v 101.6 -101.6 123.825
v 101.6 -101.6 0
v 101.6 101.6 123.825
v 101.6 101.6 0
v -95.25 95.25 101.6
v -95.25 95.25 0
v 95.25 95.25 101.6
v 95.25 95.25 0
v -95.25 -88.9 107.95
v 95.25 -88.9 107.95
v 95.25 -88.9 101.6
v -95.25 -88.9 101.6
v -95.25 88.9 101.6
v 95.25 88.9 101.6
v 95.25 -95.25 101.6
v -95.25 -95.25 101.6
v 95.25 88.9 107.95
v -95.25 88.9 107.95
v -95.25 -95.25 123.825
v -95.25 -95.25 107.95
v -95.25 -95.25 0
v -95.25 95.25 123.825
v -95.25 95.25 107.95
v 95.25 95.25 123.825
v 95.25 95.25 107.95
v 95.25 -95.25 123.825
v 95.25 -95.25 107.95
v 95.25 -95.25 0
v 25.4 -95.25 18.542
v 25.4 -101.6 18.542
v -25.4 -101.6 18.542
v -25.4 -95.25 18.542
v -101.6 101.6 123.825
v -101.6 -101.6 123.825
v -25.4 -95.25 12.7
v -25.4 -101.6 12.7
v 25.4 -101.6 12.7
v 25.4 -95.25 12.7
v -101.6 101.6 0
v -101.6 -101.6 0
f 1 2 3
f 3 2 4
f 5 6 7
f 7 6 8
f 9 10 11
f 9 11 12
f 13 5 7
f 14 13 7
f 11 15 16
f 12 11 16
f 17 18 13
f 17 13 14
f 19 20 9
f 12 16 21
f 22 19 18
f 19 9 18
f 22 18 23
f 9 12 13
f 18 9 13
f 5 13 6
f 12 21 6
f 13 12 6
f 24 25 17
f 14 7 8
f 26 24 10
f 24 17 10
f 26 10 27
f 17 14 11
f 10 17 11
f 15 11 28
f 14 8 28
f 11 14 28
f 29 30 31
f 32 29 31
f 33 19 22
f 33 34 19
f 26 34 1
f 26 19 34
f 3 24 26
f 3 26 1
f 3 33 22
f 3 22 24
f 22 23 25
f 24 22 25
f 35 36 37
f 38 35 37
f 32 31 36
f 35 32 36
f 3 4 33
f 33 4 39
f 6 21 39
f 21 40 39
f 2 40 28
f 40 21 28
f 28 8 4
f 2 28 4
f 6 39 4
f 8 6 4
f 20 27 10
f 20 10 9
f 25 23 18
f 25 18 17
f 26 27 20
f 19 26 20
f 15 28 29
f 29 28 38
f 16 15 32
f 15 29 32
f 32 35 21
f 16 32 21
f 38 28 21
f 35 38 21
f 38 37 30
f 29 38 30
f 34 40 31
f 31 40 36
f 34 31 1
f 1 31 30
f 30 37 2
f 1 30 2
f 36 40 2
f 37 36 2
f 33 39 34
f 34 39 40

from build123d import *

# Parameters (mm, degrees)
F1_DEPTH = 123.825
F2_W     = 190.5
F2_H     = 6.35
F3_DEPTH = 6.35
F4_W     = 190.5
F4_H     = 6.35
F5_DEPTH = 6.35
F7_DEPTH = 25.4


with BuildPart() as f1:
    # F0 (on Top) → F1 (new body)
    with BuildSketch(Plane.XY):
        Polygon((101.6, -101.6), (101.6, 101.6), (95.25, 95.25), (95.25, -95.25), align=None)
        Polygon((-95.25, -95.25), (-101.6, -101.6), (101.6, -101.6), (95.25, -95.25), align=None)
        Polygon((-95.25, 95.25), (-101.6, 101.6), (-101.6, -101.6), (-95.25, -95.25), align=None)
        Polygon((101.6, 101.6), (-101.6, 101.6), (-95.25, 95.25), (95.25, 95.25), align=None)
    extrude(amount=F1_DEPTH)

    # F2 (on face) → F3 (join)
    with BuildSketch(Plane.XZ.offset(-95.25)):
        with Locations((0, 104.775)):
            Rectangle(F2_W, F2_H)
    extrude(amount=F3_DEPTH)

    # F4 (on face) → F5 (join)
    with BuildSketch(Plane(origin=(0, -95.25, 0), x_dir=(-1, 0, 0), z_dir=(0, 1, 0))):
        with Locations((0, 104.775)):
            Rectangle(F4_W, F4_H)
    extrude(amount=F5_DEPTH)

    # F6 (on face) → F7 (cut)
    with BuildSketch(Plane.XZ.offset(101.6)):
        Polygon((-25.4, 12.7), (0, 12.7), (25.4, 12.7), (25.4, 18.542), (-25.4, 18.542), align=None)
    extrude(amount=-F7_DEPTH, mode=Mode.SUBTRACT)


solid = f1.part
